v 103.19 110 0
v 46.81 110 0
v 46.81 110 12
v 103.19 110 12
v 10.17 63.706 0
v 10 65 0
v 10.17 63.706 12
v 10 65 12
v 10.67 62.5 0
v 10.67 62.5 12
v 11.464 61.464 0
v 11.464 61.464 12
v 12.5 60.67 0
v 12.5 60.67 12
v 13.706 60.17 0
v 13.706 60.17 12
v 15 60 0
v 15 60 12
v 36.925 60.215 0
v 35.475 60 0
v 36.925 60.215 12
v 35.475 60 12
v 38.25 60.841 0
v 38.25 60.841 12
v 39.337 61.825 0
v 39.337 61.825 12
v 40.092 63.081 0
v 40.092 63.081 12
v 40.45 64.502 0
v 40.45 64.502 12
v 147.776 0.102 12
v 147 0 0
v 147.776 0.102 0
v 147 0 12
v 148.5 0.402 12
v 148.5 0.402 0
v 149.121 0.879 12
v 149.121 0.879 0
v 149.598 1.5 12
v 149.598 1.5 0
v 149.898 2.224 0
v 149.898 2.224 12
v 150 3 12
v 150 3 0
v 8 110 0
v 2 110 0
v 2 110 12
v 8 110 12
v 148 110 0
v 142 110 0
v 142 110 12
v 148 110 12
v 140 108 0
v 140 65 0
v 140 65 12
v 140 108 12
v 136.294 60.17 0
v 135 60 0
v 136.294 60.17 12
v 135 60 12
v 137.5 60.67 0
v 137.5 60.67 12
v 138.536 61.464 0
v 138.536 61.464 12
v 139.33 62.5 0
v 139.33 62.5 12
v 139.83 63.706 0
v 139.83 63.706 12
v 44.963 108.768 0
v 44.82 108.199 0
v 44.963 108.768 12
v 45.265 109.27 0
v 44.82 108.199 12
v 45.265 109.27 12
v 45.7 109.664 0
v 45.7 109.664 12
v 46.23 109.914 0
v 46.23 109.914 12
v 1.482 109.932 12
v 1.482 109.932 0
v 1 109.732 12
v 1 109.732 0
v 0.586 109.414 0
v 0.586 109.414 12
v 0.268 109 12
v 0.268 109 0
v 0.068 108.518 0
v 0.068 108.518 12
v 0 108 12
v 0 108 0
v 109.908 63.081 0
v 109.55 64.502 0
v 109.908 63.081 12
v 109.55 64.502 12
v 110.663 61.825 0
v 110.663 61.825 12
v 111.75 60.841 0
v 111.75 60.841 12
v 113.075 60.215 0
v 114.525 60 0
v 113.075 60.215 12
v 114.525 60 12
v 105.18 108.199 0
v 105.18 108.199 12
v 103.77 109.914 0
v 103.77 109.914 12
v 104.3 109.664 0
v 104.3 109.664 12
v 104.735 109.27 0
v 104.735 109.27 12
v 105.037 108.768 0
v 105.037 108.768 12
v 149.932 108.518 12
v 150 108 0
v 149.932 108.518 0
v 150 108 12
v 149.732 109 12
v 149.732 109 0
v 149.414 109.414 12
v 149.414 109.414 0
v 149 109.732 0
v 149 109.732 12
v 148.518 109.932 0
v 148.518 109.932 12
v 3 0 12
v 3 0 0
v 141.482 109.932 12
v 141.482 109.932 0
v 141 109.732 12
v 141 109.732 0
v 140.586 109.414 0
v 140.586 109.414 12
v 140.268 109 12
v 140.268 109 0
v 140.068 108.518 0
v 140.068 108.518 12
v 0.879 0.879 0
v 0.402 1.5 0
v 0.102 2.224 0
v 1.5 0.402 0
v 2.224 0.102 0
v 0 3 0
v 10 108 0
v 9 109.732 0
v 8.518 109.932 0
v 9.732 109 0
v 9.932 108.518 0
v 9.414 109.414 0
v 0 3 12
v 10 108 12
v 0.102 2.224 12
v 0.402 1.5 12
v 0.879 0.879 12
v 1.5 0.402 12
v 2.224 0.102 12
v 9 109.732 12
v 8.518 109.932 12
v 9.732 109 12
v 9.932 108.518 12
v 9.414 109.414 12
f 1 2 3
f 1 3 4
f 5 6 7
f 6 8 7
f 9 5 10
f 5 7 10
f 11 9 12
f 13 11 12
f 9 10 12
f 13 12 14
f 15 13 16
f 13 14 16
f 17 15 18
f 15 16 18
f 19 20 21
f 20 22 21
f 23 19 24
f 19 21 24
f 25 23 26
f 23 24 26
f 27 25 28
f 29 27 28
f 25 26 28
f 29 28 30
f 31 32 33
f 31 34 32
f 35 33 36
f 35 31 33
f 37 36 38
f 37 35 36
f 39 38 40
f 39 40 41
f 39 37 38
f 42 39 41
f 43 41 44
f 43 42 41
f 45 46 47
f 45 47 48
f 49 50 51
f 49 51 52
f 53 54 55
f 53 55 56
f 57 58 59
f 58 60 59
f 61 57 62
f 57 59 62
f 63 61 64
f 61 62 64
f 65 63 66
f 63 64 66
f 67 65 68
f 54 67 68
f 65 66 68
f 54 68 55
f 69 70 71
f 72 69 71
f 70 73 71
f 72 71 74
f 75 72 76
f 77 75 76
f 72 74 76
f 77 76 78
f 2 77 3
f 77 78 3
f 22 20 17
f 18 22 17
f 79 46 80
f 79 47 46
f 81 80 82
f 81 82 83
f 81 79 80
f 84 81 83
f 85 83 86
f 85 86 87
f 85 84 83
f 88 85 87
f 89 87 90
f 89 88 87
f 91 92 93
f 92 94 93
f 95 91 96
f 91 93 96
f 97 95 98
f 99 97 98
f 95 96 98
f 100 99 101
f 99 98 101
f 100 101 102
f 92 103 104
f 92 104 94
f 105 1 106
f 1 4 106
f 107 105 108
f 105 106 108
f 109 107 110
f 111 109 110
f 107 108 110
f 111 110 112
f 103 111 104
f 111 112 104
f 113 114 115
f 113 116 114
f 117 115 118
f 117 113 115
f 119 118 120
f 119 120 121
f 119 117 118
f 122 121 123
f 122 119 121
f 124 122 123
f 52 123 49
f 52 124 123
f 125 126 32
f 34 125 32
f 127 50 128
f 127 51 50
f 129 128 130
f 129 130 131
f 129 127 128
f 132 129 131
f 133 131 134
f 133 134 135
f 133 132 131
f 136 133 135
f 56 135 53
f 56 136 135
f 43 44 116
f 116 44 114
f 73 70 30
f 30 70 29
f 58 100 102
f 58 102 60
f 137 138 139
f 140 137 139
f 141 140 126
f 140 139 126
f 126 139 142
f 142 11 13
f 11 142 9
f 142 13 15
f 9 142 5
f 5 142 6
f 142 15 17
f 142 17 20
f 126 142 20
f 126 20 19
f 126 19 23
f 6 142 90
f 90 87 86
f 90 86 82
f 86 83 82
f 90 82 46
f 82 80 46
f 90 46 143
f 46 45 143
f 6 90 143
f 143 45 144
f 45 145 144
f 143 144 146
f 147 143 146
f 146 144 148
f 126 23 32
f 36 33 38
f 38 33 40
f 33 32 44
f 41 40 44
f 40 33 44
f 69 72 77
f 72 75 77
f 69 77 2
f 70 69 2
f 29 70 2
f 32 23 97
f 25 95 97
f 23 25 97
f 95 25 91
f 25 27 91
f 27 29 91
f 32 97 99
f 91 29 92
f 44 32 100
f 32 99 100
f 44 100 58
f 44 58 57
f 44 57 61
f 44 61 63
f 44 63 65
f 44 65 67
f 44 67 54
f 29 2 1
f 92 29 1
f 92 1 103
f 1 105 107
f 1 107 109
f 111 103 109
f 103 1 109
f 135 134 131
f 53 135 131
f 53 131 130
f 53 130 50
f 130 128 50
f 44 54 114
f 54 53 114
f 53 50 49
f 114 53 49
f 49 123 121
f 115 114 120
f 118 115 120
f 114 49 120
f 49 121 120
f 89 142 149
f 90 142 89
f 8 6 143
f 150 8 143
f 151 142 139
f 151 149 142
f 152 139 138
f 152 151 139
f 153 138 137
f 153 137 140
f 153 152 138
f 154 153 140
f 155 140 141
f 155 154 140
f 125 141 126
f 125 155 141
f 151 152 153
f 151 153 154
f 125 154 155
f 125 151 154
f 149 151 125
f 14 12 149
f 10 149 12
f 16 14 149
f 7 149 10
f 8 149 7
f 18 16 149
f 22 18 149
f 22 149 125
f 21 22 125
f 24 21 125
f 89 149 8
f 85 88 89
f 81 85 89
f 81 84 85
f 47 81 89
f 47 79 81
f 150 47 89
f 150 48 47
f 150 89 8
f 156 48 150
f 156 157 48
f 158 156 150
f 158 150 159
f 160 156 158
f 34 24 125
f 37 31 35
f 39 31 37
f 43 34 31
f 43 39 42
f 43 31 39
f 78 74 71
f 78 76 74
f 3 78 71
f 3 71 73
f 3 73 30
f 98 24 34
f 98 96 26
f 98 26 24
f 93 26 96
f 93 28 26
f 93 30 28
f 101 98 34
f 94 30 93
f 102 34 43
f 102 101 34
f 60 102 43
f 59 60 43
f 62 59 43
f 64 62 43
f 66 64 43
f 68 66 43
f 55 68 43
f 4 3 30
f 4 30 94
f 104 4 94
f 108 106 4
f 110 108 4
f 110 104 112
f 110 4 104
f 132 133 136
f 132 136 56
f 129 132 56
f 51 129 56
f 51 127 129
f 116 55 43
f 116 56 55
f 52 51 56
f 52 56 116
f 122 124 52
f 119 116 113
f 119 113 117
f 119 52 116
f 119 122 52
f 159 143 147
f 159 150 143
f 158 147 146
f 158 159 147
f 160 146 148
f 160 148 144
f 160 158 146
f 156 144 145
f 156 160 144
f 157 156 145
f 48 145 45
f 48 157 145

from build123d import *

# Parameters (mm, degrees)
ESQUISSE1_W                  = 150
ESQUISSE1_H                  = 110
BOSS_EXTRU_1_DEPTH           = 12
ENL_V_MAT_EXTRU_1_DEPTH      = 187.397424875
ENL_V_MAT_EXTRU_1_DEPTH_BACK = 187.397424875
CONG_1_R                     = 5
CONG_2_R                     = 2
CONG_3_R                     = 3


with BuildPart() as part:
    # Esquisse1 → Boss.-Extru.1 (new body)
    with BuildSketch(Plane.XY):
        with Locations((75, 55)):
            Rectangle(ESQUISSE1_W, ESQUISSE1_H)
    extrude(amount=BOSS_EXTRU_1_DEPTH)

    # Esquisse2 → Enlèv. mat.-Extru.1 (cut, two sides: drawn at the far end of the back side and taken through both)
    with BuildSketch(Plane.XY.offset(12).offset(-ENL_V_MAT_EXTRU_1_DEPTH_BACK)):
        Polygon((105, 110), (110, 60), (140, 60), (140, 110), align=None)
        Polygon((10, 110), (45, 110), (40, 60), (10, 60), align=None)
    extrude(amount=ENL_V_MAT_EXTRU_1_DEPTH + ENL_V_MAT_EXTRU_1_DEPTH_BACK, mode=Mode.SUBTRACT)

    # Congé1
    cong_1_edges = [part.edges().sort_by_distance(p)[0] for p in [
        (10, 60, 6),
        (40, 60, 6),
        (140, 60, 6),
        (110, 60, 6),
    ]]
    fillet(cong_1_edges, radius=CONG_1_R)

    # Congé2
    cong_2_edges = [part.edges().sort_by_distance(p)[0] for p in [
        (10, 110, 6),
        (45, 110, 6),
        (105, 110, 6),
        (140, 110, 6),
        (0, 110, 6),
        (150, 110, 6),
    ]]
    fillet(cong_2_edges, radius=CONG_2_R)

    # Congé3
    cong_3_edges = [part.edges().sort_by_distance(p)[0] for p in [
        (150, 0, 6),
        (0, 0, 6),
    ]]
    fillet(cong_3_edges, radius=CONG_3_R)


solid = part.part
